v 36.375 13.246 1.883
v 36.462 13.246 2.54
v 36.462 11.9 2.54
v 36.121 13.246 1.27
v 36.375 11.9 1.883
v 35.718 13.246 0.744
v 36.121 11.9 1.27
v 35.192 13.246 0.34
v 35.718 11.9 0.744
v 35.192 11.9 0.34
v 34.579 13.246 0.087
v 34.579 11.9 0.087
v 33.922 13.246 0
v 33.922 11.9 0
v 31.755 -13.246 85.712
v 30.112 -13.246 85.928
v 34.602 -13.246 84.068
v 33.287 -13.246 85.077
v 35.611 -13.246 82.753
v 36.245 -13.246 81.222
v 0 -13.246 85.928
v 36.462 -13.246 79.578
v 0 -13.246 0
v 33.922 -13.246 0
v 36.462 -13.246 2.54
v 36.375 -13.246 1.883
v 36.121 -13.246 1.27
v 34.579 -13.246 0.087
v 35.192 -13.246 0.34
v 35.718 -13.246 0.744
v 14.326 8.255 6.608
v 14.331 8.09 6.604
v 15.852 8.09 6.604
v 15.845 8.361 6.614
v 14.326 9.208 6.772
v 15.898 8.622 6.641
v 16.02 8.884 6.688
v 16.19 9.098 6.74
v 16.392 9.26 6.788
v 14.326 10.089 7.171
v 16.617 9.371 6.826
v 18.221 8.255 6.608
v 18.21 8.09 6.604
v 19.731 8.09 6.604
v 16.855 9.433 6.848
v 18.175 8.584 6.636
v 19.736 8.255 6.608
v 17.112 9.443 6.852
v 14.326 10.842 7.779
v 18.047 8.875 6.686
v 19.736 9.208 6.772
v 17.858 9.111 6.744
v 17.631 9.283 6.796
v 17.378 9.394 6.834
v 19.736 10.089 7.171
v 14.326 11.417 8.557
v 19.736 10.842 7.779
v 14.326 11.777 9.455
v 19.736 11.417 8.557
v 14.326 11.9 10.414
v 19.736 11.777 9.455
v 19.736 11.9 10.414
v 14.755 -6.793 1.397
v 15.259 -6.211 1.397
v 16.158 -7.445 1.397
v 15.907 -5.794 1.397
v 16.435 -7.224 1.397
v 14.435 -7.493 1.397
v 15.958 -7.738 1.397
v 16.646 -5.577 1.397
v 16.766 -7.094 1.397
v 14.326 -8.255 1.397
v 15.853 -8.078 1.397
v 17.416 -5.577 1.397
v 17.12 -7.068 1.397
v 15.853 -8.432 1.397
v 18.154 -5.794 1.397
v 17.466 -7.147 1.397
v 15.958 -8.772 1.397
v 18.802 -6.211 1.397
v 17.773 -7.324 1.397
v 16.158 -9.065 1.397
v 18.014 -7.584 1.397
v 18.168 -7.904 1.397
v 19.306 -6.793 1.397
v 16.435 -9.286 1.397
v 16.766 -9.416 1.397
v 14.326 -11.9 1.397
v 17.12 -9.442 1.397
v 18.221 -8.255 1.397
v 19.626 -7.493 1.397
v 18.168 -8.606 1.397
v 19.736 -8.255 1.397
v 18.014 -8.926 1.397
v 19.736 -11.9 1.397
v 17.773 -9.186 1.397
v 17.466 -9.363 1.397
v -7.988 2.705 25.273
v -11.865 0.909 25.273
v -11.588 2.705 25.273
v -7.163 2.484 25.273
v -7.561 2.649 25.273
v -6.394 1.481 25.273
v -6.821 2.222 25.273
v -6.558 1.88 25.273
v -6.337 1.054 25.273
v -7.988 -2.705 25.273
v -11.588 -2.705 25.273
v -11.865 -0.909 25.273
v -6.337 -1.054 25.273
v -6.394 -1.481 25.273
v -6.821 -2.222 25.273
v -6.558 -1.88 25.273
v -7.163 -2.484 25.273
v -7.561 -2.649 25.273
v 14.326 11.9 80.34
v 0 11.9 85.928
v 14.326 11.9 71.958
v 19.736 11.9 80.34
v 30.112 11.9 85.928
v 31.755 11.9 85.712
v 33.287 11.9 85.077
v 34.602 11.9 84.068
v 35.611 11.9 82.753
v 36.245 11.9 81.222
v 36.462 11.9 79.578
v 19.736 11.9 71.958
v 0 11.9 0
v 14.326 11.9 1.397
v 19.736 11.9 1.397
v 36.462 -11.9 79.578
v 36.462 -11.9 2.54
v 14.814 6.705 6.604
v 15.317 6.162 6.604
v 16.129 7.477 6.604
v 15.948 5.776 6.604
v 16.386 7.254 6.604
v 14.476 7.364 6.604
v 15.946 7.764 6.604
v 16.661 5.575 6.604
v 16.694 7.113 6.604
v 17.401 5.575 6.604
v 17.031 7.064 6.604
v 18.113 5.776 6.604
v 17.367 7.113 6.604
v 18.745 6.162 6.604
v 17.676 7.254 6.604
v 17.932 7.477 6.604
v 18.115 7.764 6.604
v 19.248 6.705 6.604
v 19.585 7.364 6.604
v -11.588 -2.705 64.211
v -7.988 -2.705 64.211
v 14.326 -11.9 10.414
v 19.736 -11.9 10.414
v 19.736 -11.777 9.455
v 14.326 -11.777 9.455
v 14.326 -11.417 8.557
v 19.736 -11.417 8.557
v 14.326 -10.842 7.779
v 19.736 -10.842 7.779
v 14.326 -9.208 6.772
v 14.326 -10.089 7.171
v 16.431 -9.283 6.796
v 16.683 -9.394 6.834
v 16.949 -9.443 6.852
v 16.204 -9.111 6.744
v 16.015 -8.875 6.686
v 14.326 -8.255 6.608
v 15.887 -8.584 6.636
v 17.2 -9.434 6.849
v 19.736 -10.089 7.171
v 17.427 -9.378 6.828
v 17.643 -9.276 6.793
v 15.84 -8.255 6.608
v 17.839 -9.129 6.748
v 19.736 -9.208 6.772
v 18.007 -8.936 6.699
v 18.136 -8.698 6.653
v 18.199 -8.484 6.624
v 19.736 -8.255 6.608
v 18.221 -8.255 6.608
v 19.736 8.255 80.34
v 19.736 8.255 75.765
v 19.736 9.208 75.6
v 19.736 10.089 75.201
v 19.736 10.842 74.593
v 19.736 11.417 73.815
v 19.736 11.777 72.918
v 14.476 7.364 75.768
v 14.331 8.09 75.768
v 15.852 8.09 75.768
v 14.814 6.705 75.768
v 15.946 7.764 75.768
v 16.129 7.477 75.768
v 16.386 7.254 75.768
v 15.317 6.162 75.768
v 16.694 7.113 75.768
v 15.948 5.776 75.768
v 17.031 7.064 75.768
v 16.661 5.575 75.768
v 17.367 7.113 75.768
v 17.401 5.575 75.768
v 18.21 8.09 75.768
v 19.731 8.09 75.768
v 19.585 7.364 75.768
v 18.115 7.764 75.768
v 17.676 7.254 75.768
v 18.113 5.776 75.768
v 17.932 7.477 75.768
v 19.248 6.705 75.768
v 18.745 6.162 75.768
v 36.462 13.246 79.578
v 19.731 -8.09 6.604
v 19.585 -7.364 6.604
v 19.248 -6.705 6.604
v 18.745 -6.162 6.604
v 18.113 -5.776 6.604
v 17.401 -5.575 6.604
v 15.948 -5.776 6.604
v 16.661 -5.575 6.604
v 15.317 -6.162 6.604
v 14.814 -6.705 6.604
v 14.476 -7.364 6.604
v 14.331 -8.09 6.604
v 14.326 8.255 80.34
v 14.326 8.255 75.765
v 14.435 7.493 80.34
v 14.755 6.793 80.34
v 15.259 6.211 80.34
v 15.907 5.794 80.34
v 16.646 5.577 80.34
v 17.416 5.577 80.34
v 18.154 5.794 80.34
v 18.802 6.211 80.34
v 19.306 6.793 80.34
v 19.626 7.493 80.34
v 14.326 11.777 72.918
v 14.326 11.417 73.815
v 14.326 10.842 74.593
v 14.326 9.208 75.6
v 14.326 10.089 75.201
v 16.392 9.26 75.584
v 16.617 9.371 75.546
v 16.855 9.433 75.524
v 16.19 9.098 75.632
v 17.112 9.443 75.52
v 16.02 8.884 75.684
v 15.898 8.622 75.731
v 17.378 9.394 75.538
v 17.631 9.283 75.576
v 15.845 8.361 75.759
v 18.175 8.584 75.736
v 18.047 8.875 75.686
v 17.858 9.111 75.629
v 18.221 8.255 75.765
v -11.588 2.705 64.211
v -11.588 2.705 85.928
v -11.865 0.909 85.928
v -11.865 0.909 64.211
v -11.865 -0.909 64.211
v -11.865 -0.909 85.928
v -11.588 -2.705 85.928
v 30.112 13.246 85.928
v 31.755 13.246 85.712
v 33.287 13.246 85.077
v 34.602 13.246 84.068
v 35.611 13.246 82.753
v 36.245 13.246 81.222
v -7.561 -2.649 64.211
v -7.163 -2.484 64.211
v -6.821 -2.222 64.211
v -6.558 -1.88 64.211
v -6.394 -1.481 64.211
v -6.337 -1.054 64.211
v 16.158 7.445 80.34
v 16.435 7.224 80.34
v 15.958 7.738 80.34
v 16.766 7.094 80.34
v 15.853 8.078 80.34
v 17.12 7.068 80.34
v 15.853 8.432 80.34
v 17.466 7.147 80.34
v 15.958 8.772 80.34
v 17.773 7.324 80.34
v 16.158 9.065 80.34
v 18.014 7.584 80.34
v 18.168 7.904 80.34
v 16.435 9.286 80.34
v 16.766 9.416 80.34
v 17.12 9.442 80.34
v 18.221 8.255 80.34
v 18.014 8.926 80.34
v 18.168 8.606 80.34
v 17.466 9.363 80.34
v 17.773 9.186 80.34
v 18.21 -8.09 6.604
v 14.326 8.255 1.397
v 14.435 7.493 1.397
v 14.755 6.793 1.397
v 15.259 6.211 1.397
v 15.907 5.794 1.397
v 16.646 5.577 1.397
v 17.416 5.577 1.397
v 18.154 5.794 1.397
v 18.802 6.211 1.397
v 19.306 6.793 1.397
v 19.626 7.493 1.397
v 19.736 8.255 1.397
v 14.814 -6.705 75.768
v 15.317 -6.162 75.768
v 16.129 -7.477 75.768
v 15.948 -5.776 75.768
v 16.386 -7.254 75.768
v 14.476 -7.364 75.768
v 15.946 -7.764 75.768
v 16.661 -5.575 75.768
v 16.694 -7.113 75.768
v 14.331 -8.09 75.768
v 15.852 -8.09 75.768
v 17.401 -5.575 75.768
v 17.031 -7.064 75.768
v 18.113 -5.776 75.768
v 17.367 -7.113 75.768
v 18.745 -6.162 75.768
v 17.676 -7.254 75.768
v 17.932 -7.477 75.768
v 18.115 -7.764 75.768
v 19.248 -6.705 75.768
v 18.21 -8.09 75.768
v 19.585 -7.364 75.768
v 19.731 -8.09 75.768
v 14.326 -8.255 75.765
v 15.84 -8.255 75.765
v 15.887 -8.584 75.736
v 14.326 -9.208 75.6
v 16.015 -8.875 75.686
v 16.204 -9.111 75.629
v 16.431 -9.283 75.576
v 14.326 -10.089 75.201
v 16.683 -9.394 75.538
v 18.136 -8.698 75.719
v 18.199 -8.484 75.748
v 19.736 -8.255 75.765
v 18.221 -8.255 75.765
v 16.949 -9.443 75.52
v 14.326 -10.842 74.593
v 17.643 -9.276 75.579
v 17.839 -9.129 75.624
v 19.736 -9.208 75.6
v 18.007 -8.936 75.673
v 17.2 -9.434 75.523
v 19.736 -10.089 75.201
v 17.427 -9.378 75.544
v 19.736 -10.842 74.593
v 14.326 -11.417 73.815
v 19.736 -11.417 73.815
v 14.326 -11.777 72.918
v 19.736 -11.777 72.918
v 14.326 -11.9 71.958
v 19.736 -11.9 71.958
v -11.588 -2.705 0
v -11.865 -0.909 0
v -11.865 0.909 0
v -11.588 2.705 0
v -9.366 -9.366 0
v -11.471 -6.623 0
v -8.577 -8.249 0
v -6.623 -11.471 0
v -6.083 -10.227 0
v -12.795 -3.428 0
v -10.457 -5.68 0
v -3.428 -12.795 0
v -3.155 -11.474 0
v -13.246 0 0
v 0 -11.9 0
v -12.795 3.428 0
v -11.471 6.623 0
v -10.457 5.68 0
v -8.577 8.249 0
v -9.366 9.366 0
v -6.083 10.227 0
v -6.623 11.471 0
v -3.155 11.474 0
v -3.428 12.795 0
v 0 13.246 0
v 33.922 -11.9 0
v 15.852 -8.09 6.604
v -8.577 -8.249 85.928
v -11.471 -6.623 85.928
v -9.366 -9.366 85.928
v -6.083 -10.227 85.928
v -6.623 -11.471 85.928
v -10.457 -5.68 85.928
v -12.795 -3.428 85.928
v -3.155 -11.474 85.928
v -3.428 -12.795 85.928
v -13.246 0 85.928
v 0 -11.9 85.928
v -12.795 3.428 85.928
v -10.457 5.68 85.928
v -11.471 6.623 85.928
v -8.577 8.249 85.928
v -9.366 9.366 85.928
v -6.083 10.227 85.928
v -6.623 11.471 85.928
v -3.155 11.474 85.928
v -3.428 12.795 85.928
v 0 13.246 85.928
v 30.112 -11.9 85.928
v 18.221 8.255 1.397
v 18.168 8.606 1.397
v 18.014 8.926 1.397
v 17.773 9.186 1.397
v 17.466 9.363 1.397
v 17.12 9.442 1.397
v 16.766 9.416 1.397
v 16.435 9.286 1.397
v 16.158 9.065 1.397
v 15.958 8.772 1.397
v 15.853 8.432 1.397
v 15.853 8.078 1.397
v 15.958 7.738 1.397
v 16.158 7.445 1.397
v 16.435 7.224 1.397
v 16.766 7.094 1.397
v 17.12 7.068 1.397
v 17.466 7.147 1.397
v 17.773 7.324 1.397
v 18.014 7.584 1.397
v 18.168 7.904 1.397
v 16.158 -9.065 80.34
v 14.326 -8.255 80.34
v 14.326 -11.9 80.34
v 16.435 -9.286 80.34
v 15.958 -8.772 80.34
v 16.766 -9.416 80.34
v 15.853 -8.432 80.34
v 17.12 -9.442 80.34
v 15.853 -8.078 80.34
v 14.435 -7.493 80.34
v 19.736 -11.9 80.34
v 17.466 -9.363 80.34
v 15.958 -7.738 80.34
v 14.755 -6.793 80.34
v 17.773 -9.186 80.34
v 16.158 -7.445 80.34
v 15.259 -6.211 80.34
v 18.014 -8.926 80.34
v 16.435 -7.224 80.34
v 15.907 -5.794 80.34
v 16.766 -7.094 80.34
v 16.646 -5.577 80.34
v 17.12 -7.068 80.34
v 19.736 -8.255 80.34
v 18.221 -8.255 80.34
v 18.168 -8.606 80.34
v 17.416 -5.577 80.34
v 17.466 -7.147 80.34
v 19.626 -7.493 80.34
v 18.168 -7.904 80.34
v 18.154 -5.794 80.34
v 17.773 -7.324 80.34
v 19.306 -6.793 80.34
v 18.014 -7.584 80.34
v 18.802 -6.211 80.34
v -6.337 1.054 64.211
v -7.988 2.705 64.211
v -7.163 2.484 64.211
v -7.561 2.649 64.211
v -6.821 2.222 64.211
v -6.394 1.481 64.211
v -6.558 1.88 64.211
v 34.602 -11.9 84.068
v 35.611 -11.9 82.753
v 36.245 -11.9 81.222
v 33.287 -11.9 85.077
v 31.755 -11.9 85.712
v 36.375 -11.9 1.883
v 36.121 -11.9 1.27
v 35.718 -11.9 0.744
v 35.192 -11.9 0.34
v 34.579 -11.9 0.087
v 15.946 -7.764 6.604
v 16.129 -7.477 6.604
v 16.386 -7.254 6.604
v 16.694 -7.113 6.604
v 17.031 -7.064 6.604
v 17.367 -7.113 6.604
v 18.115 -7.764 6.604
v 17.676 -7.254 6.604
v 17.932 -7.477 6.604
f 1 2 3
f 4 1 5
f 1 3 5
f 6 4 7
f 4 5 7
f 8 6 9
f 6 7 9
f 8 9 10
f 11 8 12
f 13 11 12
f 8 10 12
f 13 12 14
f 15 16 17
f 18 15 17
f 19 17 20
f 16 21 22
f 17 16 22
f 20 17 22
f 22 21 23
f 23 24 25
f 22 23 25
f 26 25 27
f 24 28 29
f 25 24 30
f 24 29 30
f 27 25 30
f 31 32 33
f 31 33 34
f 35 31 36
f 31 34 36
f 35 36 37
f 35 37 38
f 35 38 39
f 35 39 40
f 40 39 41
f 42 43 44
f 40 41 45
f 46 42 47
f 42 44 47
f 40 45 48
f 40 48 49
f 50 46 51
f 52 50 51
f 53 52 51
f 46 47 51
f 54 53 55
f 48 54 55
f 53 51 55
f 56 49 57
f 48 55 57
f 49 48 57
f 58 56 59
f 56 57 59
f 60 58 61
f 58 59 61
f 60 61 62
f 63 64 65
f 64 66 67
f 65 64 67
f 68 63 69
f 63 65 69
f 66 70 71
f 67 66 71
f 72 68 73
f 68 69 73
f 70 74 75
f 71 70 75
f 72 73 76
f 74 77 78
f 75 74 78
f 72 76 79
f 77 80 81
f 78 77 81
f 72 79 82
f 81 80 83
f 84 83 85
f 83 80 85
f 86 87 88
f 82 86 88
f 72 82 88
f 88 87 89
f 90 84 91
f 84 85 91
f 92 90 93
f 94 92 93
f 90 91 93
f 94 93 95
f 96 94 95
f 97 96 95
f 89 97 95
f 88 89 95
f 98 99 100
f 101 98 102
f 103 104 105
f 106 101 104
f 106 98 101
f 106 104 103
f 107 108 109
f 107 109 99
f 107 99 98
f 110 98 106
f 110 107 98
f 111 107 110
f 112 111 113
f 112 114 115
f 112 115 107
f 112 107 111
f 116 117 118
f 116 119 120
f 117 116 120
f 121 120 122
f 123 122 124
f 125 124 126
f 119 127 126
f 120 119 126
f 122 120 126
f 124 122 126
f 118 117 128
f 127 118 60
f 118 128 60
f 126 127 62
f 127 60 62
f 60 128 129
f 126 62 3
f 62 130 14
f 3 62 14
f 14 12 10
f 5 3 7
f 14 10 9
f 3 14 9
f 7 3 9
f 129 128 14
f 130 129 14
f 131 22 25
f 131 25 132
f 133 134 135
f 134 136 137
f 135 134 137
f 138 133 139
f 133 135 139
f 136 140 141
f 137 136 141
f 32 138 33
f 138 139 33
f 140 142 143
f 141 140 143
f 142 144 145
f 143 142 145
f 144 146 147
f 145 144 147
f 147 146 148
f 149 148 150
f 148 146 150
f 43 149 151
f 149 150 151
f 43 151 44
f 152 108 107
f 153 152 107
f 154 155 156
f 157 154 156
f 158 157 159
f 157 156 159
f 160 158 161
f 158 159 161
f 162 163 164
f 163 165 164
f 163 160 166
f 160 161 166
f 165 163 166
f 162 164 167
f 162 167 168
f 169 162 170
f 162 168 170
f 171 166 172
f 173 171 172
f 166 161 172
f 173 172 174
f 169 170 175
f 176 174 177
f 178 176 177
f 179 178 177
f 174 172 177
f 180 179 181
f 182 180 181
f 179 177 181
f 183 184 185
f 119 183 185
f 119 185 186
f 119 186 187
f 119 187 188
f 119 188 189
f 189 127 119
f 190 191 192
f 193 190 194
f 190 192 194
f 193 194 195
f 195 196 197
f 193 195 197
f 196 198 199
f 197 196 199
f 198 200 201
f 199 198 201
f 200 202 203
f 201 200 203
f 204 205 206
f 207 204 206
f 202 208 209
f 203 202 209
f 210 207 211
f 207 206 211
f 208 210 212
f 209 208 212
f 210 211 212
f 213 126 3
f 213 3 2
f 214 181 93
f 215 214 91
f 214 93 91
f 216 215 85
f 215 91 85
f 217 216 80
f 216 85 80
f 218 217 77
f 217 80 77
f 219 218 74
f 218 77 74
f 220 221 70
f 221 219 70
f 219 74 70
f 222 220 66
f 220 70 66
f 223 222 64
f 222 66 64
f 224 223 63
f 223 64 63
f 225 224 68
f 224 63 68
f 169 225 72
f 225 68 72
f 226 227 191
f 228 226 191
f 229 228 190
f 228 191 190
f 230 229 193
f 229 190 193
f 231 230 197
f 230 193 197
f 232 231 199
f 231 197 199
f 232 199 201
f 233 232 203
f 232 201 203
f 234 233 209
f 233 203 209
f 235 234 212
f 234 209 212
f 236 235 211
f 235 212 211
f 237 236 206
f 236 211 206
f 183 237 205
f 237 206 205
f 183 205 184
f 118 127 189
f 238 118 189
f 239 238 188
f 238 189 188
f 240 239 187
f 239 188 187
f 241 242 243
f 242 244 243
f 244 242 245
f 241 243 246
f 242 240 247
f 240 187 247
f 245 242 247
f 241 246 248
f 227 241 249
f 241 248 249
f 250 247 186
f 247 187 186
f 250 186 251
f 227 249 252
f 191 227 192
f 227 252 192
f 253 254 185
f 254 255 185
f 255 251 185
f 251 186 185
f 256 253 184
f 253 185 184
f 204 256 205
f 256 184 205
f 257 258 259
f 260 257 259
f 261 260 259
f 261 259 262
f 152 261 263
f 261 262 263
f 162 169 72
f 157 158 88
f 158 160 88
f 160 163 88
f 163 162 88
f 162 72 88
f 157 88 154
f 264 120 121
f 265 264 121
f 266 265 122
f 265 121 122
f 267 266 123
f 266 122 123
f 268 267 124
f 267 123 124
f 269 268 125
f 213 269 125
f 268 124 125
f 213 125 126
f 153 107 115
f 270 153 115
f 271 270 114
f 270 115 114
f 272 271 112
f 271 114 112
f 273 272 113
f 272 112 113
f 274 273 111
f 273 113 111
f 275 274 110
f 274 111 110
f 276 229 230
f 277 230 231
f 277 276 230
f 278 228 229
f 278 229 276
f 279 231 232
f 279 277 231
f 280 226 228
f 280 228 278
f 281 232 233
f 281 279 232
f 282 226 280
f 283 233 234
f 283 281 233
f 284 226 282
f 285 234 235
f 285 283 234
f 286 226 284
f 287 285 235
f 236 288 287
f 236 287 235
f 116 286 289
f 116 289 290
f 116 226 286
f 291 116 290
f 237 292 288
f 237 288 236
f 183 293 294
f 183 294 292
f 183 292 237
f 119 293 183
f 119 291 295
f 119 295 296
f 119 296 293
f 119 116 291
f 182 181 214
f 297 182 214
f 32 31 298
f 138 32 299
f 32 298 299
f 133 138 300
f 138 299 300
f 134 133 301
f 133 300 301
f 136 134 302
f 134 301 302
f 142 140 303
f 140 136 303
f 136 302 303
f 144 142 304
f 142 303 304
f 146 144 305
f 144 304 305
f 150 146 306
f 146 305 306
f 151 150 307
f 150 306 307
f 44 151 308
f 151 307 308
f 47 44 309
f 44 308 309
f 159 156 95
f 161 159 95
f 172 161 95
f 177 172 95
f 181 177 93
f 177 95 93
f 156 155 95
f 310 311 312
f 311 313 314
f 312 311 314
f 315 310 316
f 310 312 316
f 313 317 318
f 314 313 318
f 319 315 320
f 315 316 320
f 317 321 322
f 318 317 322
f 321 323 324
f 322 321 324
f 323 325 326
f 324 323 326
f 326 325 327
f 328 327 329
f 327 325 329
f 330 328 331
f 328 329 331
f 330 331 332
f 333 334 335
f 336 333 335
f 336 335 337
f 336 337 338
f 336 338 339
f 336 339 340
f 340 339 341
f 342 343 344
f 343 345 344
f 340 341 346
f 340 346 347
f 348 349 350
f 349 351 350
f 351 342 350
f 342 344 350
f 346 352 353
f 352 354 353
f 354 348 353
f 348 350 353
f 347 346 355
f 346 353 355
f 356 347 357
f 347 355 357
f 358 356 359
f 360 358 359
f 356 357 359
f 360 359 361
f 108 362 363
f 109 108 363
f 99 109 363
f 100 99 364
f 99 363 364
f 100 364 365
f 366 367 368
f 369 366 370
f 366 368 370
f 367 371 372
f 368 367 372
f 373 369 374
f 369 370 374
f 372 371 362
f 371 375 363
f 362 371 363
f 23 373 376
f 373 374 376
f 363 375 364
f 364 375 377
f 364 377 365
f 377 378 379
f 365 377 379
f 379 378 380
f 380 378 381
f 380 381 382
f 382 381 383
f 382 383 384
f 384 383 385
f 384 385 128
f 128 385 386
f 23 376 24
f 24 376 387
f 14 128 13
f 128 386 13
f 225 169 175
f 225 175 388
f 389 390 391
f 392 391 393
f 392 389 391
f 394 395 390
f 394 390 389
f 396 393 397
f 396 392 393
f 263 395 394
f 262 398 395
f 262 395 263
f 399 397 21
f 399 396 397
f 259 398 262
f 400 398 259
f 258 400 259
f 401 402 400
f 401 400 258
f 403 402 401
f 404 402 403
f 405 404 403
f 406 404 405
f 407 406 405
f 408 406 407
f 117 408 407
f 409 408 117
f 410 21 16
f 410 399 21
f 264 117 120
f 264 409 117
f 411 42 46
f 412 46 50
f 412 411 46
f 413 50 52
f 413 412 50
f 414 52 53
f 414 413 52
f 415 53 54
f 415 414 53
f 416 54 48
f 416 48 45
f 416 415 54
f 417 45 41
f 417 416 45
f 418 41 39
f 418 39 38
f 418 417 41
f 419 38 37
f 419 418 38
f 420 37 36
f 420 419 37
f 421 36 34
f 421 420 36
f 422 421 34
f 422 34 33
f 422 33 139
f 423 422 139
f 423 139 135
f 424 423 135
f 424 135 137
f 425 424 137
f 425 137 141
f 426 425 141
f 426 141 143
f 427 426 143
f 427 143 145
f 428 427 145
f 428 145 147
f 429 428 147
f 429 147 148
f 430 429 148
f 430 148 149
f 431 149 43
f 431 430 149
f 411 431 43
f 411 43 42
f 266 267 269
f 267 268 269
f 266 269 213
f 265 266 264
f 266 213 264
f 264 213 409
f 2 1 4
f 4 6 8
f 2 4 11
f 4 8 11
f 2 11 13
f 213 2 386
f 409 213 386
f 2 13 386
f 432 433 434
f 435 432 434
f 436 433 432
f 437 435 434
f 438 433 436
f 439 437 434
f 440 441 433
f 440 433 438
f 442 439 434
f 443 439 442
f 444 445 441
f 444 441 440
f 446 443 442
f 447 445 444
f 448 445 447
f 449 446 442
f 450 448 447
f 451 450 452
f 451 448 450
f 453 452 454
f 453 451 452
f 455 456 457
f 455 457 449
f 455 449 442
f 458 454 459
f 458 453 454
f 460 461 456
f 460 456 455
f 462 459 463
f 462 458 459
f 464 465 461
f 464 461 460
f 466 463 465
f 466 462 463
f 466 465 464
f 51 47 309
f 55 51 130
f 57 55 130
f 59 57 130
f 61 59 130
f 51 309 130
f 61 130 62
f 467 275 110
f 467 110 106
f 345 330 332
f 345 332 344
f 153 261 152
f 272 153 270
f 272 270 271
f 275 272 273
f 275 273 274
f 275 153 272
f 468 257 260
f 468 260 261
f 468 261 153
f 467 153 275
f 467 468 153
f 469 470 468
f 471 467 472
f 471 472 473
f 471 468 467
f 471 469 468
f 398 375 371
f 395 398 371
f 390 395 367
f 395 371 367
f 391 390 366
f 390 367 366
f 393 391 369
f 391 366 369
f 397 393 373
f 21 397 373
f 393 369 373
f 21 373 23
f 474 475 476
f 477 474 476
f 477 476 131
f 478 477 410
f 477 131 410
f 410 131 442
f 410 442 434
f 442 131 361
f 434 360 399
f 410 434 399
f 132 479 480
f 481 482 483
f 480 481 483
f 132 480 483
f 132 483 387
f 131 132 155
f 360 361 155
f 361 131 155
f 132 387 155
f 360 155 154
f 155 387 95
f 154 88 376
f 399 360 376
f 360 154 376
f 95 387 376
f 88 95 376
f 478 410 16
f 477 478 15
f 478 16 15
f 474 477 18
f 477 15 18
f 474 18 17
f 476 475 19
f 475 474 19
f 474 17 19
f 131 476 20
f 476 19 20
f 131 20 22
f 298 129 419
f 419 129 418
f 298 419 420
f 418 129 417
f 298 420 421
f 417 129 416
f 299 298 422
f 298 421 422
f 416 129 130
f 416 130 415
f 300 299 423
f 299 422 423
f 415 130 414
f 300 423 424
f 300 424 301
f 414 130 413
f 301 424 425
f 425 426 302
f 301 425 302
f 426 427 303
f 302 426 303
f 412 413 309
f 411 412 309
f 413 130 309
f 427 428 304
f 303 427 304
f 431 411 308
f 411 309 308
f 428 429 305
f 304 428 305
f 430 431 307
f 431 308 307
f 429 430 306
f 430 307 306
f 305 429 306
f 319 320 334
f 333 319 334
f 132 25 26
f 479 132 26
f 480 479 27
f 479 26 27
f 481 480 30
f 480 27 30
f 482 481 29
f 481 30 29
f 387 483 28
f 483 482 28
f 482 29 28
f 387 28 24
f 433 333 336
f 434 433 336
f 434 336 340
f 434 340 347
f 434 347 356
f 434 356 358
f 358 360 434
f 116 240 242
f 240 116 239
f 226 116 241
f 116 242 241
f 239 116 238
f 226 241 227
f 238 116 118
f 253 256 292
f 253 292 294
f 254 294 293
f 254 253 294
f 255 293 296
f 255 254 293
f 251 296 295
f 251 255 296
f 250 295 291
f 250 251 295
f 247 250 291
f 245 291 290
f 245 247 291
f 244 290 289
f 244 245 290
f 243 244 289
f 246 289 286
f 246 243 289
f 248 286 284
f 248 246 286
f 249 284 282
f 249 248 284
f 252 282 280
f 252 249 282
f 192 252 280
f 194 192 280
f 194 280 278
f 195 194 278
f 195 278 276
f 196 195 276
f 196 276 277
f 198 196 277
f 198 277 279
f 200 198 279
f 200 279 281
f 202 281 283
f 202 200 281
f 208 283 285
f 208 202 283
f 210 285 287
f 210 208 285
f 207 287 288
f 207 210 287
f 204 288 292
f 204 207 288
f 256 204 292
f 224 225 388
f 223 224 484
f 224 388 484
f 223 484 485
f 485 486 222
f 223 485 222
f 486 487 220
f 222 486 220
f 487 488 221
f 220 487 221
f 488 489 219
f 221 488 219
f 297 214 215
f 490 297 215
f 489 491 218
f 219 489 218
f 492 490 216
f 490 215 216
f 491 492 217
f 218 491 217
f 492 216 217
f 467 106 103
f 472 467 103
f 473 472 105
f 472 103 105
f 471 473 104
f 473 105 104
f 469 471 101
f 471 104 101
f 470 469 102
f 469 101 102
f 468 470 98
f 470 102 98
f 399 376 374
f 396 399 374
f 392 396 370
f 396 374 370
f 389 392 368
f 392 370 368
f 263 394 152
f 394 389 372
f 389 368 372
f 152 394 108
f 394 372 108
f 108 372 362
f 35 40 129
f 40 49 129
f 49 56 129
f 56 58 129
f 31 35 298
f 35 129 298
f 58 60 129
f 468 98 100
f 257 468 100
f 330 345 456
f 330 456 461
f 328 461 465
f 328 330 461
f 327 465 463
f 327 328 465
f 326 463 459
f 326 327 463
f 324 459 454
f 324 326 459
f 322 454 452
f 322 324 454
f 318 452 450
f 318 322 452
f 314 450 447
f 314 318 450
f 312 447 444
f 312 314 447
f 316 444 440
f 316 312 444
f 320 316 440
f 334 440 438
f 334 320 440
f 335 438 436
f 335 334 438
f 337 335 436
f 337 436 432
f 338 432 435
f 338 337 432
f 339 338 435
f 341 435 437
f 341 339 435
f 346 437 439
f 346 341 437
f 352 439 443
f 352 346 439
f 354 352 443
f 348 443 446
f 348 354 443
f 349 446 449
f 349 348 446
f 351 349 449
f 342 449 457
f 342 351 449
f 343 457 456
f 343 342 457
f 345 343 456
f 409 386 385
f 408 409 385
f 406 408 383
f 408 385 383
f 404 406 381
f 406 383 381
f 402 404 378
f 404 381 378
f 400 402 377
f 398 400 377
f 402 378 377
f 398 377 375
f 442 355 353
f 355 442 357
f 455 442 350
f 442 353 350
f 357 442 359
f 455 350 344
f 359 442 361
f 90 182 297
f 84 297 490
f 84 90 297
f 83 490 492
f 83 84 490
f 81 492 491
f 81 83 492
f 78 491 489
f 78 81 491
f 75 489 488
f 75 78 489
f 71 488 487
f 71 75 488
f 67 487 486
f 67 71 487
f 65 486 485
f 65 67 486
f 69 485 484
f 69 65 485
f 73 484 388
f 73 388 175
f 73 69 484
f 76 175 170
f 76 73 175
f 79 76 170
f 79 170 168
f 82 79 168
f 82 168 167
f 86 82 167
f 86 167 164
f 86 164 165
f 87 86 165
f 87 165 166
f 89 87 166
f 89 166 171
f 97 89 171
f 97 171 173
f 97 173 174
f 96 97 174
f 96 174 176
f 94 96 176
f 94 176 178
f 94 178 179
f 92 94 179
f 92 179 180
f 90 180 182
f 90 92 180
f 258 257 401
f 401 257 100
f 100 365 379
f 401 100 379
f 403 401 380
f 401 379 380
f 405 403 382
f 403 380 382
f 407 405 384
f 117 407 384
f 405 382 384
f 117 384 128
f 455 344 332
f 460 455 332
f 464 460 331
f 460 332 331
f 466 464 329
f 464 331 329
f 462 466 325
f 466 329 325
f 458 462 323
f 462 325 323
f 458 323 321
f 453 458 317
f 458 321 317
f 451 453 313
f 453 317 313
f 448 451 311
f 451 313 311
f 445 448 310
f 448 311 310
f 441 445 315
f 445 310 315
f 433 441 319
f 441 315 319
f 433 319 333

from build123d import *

# Parameters (mm, degrees)
F0_R      = 1.190625
F1_DEPTH  = 85.9282
F3_DEPTH  = 21.717
F2_R      = 11.8999
F2_W      = 5.4102
F2_H      = 23.7998
F4_DEPTH  = 5.588
F6_DEPTH  = 6.35
F7_W      = 3.6449
F7_H      = 1.397
F8_DEPTH  = 6.35
F9_R      = 11.8999
F10_DEPTH = 25.273
F12_DEPTH = 26.4922


with BuildPart() as f1:
    # F0 (on Top) → F1 (new body)
    with BuildSketch(Plane.XY):
        with BuildLine():
            Line((36.4617, 13.2461), (0, 13.2461))
            ThreePointArc((0, 13.2461), (-9.3664071343, 9.3664071343), (-13.2461, 0))
            ThreePointArc((-13.2461, 0), (-9.3664071343, -9.3664071343), (0, -13.2461))
            Line((0, -13.2461), (36.4617, -13.2461))
            Line((36.4617, -13.2461), (36.4617, -11.8999))
            Line((36.4617, -11.8999), (19.7358, -11.8999))
            Line((19.7358, -11.8999), (19.7358, -8.255))
            ThreePointArc((19.7358, -8.255), (17.0307, -5.5499), (14.3256, -8.255))
            Line((14.3256, -8.255), (14.3256, -11.8999))
            Line((14.3256, -11.8999), (0, -11.8999))
            ThreePointArc((0, -11.8999), (-7.3965262293, -9.3219643718), (-11.588358555, -2.7051))
            Line((-11.588358555, -2.7051), (-7.9883, -2.7051))
            ThreePointArc((-7.9883, -2.7051), (-6.8208667043, -2.2215332957), (-6.3373, -1.0541))
            Line((-6.3373, -1.0541), (-6.3373, 1.0541))
            ThreePointArc((-6.3373, 1.0541), (-6.8208667043, 2.2215332957), (-7.9883, 2.7051))
            Line((-7.9883, 2.7051), (-11.588358555, 2.7051))
            ThreePointArc((-11.588358555, 2.7051), (-7.3965262293, 9.3219643718), (0, 11.8999))
            Line((0, 11.8999), (14.3256, 11.8999))
            Line((14.3256, 11.8999), (14.3256, 8.255))
            ThreePointArc((14.3256, 8.255), (17.0307, 5.5499), (19.7358, 8.255))
            Line((19.7358, 8.255), (19.7358, 11.8999))
            Line((19.7358, 11.8999), (36.4617, 11.8999))
            Line((36.4617, 11.8999), (36.4617, 13.2461))
        make_face()
        with Locations((17.0307, -8.255)):
            Circle(F0_R, mode=Mode.SUBTRACT)
        with Locations((17.0307, 8.255)):
            Circle(F0_R, mode=Mode.SUBTRACT)
    extrude(amount=F1_DEPTH)

    # F2 (on face) → F3 (cut)
    with BuildSketch(Plane.XY.offset(85.9282)):
        with BuildLine():
            Line((-7.9883, 2.7051), (-11.588358555, 2.7051))
            ThreePointArc((-11.588358555, 2.7051), (-11.8999, 0), (-11.588358555, -2.7051))
            Line((-11.588358555, -2.7051), (-7.9883, -2.7051))
            ThreePointArc((-7.9883, -2.7051), (-6.8208667043, -2.2215332957), (-6.3373, -1.0541))
            Line((-6.3373, -1.0541), (-6.3373, 1.0541))
            ThreePointArc((-6.3373, 1.0541), (-6.8208667043, 2.2215332957), (-7.9883, 2.7051))
        make_face()
    extrude(amount=-F3_DEPTH, mode=Mode.SUBTRACT)

    # F2 (on face) → F4 (cut)
    with BuildSketch(Plane.XY.offset(85.9282)):
        Circle(F2_R)
        with Locations((17.0307, 0)):
            Rectangle(F2_W, F2_H)
    extrude(amount=-F4_DEPTH, mode=Mode.SUBTRACT)

    # F5 (on face) → F6 (cut)
    with BuildSketch(Plane.YZ.offset(19.7358)):
        with BuildLine():
            ThreePointArc((-8.255, 75.7646211525), (-10.8417294824, 74.593258728), (-11.8999, 71.9582))
            Line((-11.8999, 71.9582), (-11.8999, 10.414))
            ThreePointArc((-11.8999, 10.414), (-10.8417294824, 7.778941272), (-8.255, 6.6075788475))
            Line((-8.255, 6.6075788475), (-8.255, 75.7646211525))
        make_face()
        with BuildLine():
            ThreePointArc((-8.0899, 75.7682), (-8.1724693923, 75.767305183), (-8.255, 75.7646211525))
            Line((-8.255, 75.7646211525), (-8.255, 6.6075788475))
            ThreePointArc((-8.255, 6.6075788475), (-8.1724693923, 6.604894817), (-8.0899, 6.604))
            Line((-8.0899, 6.604), (-4.5909816399, 6.604))
            Line((-4.5909816399, 6.604), (-4.5909816399, 75.7682))
            Line((-4.5909816399, 75.7682), (-8.0899, 75.7682))
        make_face()
        with BuildLine():
            ThreePointArc((8.0899, 6.604), (10.7839768363, 7.7199231637), (11.8999, 10.414))
            Line((11.8999, 10.414), (11.8999, 71.9582))
            ThreePointArc((11.8999, 71.9582), (10.7839768363, 74.6522768363), (8.0899, 75.7682))
            Line((8.0899, 75.7682), (4.5909816399, 75.7682))
            Line((4.5909816399, 75.7682), (4.5909816399, 6.604))
            Line((4.5909816399, 6.604), (8.0899, 6.604))
        make_face()
    extrude(amount=-F6_DEPTH, mode=Mode.SUBTRACT)

    # F7 (on face) → F8 (cut)
    with BuildSketch(Plane.YZ.offset(19.7358)):
        Polygon((8.255, 0), (8.255, 1.397), (-11.8999, 1.397), (-11.8999, -1.397), (11.8999, -1.397), (11.8999, 0), align=None)
        with Locations((10.07745, 0.6985)):
            Rectangle(F7_W, F7_H)
    extrude(amount=-F8_DEPTH, mode=Mode.SUBTRACT)

    # F9 (on face) → F10 (cut)
    with BuildSketch(Plane(origin=(0, 0, 0), x_dir=(1, 0, 0), z_dir=(0, 0, -1))):
        Circle(F9_R)
    extrude(amount=-F10_DEPTH, mode=Mode.SUBTRACT)

    # F11 (on face) → F12 (cut, through all)
    with BuildSketch(Plane.XZ.offset(13.2461)):
        with BuildLine():
            ThreePointArc((30.1117, 85.9282), (34.6018280605, 84.0683280605), (36.4617, 79.5782))
            Line((36.4617, 79.5782), (36.4617, 85.9282))
            Line((36.4617, 85.9282), (30.1117, 85.9282))
        make_face()
        with BuildLine():
            ThreePointArc((36.4617, 2.54), (35.7177512242, 0.7439487758), (33.9217, 0))
            Line((33.9217, 0), (36.4617, 0))
            Line((36.4617, 0), (36.4617, 2.54))
        make_face()
    extrude(amount=-F12_DEPTH, mode=Mode.SUBTRACT)


solid = f1.part
